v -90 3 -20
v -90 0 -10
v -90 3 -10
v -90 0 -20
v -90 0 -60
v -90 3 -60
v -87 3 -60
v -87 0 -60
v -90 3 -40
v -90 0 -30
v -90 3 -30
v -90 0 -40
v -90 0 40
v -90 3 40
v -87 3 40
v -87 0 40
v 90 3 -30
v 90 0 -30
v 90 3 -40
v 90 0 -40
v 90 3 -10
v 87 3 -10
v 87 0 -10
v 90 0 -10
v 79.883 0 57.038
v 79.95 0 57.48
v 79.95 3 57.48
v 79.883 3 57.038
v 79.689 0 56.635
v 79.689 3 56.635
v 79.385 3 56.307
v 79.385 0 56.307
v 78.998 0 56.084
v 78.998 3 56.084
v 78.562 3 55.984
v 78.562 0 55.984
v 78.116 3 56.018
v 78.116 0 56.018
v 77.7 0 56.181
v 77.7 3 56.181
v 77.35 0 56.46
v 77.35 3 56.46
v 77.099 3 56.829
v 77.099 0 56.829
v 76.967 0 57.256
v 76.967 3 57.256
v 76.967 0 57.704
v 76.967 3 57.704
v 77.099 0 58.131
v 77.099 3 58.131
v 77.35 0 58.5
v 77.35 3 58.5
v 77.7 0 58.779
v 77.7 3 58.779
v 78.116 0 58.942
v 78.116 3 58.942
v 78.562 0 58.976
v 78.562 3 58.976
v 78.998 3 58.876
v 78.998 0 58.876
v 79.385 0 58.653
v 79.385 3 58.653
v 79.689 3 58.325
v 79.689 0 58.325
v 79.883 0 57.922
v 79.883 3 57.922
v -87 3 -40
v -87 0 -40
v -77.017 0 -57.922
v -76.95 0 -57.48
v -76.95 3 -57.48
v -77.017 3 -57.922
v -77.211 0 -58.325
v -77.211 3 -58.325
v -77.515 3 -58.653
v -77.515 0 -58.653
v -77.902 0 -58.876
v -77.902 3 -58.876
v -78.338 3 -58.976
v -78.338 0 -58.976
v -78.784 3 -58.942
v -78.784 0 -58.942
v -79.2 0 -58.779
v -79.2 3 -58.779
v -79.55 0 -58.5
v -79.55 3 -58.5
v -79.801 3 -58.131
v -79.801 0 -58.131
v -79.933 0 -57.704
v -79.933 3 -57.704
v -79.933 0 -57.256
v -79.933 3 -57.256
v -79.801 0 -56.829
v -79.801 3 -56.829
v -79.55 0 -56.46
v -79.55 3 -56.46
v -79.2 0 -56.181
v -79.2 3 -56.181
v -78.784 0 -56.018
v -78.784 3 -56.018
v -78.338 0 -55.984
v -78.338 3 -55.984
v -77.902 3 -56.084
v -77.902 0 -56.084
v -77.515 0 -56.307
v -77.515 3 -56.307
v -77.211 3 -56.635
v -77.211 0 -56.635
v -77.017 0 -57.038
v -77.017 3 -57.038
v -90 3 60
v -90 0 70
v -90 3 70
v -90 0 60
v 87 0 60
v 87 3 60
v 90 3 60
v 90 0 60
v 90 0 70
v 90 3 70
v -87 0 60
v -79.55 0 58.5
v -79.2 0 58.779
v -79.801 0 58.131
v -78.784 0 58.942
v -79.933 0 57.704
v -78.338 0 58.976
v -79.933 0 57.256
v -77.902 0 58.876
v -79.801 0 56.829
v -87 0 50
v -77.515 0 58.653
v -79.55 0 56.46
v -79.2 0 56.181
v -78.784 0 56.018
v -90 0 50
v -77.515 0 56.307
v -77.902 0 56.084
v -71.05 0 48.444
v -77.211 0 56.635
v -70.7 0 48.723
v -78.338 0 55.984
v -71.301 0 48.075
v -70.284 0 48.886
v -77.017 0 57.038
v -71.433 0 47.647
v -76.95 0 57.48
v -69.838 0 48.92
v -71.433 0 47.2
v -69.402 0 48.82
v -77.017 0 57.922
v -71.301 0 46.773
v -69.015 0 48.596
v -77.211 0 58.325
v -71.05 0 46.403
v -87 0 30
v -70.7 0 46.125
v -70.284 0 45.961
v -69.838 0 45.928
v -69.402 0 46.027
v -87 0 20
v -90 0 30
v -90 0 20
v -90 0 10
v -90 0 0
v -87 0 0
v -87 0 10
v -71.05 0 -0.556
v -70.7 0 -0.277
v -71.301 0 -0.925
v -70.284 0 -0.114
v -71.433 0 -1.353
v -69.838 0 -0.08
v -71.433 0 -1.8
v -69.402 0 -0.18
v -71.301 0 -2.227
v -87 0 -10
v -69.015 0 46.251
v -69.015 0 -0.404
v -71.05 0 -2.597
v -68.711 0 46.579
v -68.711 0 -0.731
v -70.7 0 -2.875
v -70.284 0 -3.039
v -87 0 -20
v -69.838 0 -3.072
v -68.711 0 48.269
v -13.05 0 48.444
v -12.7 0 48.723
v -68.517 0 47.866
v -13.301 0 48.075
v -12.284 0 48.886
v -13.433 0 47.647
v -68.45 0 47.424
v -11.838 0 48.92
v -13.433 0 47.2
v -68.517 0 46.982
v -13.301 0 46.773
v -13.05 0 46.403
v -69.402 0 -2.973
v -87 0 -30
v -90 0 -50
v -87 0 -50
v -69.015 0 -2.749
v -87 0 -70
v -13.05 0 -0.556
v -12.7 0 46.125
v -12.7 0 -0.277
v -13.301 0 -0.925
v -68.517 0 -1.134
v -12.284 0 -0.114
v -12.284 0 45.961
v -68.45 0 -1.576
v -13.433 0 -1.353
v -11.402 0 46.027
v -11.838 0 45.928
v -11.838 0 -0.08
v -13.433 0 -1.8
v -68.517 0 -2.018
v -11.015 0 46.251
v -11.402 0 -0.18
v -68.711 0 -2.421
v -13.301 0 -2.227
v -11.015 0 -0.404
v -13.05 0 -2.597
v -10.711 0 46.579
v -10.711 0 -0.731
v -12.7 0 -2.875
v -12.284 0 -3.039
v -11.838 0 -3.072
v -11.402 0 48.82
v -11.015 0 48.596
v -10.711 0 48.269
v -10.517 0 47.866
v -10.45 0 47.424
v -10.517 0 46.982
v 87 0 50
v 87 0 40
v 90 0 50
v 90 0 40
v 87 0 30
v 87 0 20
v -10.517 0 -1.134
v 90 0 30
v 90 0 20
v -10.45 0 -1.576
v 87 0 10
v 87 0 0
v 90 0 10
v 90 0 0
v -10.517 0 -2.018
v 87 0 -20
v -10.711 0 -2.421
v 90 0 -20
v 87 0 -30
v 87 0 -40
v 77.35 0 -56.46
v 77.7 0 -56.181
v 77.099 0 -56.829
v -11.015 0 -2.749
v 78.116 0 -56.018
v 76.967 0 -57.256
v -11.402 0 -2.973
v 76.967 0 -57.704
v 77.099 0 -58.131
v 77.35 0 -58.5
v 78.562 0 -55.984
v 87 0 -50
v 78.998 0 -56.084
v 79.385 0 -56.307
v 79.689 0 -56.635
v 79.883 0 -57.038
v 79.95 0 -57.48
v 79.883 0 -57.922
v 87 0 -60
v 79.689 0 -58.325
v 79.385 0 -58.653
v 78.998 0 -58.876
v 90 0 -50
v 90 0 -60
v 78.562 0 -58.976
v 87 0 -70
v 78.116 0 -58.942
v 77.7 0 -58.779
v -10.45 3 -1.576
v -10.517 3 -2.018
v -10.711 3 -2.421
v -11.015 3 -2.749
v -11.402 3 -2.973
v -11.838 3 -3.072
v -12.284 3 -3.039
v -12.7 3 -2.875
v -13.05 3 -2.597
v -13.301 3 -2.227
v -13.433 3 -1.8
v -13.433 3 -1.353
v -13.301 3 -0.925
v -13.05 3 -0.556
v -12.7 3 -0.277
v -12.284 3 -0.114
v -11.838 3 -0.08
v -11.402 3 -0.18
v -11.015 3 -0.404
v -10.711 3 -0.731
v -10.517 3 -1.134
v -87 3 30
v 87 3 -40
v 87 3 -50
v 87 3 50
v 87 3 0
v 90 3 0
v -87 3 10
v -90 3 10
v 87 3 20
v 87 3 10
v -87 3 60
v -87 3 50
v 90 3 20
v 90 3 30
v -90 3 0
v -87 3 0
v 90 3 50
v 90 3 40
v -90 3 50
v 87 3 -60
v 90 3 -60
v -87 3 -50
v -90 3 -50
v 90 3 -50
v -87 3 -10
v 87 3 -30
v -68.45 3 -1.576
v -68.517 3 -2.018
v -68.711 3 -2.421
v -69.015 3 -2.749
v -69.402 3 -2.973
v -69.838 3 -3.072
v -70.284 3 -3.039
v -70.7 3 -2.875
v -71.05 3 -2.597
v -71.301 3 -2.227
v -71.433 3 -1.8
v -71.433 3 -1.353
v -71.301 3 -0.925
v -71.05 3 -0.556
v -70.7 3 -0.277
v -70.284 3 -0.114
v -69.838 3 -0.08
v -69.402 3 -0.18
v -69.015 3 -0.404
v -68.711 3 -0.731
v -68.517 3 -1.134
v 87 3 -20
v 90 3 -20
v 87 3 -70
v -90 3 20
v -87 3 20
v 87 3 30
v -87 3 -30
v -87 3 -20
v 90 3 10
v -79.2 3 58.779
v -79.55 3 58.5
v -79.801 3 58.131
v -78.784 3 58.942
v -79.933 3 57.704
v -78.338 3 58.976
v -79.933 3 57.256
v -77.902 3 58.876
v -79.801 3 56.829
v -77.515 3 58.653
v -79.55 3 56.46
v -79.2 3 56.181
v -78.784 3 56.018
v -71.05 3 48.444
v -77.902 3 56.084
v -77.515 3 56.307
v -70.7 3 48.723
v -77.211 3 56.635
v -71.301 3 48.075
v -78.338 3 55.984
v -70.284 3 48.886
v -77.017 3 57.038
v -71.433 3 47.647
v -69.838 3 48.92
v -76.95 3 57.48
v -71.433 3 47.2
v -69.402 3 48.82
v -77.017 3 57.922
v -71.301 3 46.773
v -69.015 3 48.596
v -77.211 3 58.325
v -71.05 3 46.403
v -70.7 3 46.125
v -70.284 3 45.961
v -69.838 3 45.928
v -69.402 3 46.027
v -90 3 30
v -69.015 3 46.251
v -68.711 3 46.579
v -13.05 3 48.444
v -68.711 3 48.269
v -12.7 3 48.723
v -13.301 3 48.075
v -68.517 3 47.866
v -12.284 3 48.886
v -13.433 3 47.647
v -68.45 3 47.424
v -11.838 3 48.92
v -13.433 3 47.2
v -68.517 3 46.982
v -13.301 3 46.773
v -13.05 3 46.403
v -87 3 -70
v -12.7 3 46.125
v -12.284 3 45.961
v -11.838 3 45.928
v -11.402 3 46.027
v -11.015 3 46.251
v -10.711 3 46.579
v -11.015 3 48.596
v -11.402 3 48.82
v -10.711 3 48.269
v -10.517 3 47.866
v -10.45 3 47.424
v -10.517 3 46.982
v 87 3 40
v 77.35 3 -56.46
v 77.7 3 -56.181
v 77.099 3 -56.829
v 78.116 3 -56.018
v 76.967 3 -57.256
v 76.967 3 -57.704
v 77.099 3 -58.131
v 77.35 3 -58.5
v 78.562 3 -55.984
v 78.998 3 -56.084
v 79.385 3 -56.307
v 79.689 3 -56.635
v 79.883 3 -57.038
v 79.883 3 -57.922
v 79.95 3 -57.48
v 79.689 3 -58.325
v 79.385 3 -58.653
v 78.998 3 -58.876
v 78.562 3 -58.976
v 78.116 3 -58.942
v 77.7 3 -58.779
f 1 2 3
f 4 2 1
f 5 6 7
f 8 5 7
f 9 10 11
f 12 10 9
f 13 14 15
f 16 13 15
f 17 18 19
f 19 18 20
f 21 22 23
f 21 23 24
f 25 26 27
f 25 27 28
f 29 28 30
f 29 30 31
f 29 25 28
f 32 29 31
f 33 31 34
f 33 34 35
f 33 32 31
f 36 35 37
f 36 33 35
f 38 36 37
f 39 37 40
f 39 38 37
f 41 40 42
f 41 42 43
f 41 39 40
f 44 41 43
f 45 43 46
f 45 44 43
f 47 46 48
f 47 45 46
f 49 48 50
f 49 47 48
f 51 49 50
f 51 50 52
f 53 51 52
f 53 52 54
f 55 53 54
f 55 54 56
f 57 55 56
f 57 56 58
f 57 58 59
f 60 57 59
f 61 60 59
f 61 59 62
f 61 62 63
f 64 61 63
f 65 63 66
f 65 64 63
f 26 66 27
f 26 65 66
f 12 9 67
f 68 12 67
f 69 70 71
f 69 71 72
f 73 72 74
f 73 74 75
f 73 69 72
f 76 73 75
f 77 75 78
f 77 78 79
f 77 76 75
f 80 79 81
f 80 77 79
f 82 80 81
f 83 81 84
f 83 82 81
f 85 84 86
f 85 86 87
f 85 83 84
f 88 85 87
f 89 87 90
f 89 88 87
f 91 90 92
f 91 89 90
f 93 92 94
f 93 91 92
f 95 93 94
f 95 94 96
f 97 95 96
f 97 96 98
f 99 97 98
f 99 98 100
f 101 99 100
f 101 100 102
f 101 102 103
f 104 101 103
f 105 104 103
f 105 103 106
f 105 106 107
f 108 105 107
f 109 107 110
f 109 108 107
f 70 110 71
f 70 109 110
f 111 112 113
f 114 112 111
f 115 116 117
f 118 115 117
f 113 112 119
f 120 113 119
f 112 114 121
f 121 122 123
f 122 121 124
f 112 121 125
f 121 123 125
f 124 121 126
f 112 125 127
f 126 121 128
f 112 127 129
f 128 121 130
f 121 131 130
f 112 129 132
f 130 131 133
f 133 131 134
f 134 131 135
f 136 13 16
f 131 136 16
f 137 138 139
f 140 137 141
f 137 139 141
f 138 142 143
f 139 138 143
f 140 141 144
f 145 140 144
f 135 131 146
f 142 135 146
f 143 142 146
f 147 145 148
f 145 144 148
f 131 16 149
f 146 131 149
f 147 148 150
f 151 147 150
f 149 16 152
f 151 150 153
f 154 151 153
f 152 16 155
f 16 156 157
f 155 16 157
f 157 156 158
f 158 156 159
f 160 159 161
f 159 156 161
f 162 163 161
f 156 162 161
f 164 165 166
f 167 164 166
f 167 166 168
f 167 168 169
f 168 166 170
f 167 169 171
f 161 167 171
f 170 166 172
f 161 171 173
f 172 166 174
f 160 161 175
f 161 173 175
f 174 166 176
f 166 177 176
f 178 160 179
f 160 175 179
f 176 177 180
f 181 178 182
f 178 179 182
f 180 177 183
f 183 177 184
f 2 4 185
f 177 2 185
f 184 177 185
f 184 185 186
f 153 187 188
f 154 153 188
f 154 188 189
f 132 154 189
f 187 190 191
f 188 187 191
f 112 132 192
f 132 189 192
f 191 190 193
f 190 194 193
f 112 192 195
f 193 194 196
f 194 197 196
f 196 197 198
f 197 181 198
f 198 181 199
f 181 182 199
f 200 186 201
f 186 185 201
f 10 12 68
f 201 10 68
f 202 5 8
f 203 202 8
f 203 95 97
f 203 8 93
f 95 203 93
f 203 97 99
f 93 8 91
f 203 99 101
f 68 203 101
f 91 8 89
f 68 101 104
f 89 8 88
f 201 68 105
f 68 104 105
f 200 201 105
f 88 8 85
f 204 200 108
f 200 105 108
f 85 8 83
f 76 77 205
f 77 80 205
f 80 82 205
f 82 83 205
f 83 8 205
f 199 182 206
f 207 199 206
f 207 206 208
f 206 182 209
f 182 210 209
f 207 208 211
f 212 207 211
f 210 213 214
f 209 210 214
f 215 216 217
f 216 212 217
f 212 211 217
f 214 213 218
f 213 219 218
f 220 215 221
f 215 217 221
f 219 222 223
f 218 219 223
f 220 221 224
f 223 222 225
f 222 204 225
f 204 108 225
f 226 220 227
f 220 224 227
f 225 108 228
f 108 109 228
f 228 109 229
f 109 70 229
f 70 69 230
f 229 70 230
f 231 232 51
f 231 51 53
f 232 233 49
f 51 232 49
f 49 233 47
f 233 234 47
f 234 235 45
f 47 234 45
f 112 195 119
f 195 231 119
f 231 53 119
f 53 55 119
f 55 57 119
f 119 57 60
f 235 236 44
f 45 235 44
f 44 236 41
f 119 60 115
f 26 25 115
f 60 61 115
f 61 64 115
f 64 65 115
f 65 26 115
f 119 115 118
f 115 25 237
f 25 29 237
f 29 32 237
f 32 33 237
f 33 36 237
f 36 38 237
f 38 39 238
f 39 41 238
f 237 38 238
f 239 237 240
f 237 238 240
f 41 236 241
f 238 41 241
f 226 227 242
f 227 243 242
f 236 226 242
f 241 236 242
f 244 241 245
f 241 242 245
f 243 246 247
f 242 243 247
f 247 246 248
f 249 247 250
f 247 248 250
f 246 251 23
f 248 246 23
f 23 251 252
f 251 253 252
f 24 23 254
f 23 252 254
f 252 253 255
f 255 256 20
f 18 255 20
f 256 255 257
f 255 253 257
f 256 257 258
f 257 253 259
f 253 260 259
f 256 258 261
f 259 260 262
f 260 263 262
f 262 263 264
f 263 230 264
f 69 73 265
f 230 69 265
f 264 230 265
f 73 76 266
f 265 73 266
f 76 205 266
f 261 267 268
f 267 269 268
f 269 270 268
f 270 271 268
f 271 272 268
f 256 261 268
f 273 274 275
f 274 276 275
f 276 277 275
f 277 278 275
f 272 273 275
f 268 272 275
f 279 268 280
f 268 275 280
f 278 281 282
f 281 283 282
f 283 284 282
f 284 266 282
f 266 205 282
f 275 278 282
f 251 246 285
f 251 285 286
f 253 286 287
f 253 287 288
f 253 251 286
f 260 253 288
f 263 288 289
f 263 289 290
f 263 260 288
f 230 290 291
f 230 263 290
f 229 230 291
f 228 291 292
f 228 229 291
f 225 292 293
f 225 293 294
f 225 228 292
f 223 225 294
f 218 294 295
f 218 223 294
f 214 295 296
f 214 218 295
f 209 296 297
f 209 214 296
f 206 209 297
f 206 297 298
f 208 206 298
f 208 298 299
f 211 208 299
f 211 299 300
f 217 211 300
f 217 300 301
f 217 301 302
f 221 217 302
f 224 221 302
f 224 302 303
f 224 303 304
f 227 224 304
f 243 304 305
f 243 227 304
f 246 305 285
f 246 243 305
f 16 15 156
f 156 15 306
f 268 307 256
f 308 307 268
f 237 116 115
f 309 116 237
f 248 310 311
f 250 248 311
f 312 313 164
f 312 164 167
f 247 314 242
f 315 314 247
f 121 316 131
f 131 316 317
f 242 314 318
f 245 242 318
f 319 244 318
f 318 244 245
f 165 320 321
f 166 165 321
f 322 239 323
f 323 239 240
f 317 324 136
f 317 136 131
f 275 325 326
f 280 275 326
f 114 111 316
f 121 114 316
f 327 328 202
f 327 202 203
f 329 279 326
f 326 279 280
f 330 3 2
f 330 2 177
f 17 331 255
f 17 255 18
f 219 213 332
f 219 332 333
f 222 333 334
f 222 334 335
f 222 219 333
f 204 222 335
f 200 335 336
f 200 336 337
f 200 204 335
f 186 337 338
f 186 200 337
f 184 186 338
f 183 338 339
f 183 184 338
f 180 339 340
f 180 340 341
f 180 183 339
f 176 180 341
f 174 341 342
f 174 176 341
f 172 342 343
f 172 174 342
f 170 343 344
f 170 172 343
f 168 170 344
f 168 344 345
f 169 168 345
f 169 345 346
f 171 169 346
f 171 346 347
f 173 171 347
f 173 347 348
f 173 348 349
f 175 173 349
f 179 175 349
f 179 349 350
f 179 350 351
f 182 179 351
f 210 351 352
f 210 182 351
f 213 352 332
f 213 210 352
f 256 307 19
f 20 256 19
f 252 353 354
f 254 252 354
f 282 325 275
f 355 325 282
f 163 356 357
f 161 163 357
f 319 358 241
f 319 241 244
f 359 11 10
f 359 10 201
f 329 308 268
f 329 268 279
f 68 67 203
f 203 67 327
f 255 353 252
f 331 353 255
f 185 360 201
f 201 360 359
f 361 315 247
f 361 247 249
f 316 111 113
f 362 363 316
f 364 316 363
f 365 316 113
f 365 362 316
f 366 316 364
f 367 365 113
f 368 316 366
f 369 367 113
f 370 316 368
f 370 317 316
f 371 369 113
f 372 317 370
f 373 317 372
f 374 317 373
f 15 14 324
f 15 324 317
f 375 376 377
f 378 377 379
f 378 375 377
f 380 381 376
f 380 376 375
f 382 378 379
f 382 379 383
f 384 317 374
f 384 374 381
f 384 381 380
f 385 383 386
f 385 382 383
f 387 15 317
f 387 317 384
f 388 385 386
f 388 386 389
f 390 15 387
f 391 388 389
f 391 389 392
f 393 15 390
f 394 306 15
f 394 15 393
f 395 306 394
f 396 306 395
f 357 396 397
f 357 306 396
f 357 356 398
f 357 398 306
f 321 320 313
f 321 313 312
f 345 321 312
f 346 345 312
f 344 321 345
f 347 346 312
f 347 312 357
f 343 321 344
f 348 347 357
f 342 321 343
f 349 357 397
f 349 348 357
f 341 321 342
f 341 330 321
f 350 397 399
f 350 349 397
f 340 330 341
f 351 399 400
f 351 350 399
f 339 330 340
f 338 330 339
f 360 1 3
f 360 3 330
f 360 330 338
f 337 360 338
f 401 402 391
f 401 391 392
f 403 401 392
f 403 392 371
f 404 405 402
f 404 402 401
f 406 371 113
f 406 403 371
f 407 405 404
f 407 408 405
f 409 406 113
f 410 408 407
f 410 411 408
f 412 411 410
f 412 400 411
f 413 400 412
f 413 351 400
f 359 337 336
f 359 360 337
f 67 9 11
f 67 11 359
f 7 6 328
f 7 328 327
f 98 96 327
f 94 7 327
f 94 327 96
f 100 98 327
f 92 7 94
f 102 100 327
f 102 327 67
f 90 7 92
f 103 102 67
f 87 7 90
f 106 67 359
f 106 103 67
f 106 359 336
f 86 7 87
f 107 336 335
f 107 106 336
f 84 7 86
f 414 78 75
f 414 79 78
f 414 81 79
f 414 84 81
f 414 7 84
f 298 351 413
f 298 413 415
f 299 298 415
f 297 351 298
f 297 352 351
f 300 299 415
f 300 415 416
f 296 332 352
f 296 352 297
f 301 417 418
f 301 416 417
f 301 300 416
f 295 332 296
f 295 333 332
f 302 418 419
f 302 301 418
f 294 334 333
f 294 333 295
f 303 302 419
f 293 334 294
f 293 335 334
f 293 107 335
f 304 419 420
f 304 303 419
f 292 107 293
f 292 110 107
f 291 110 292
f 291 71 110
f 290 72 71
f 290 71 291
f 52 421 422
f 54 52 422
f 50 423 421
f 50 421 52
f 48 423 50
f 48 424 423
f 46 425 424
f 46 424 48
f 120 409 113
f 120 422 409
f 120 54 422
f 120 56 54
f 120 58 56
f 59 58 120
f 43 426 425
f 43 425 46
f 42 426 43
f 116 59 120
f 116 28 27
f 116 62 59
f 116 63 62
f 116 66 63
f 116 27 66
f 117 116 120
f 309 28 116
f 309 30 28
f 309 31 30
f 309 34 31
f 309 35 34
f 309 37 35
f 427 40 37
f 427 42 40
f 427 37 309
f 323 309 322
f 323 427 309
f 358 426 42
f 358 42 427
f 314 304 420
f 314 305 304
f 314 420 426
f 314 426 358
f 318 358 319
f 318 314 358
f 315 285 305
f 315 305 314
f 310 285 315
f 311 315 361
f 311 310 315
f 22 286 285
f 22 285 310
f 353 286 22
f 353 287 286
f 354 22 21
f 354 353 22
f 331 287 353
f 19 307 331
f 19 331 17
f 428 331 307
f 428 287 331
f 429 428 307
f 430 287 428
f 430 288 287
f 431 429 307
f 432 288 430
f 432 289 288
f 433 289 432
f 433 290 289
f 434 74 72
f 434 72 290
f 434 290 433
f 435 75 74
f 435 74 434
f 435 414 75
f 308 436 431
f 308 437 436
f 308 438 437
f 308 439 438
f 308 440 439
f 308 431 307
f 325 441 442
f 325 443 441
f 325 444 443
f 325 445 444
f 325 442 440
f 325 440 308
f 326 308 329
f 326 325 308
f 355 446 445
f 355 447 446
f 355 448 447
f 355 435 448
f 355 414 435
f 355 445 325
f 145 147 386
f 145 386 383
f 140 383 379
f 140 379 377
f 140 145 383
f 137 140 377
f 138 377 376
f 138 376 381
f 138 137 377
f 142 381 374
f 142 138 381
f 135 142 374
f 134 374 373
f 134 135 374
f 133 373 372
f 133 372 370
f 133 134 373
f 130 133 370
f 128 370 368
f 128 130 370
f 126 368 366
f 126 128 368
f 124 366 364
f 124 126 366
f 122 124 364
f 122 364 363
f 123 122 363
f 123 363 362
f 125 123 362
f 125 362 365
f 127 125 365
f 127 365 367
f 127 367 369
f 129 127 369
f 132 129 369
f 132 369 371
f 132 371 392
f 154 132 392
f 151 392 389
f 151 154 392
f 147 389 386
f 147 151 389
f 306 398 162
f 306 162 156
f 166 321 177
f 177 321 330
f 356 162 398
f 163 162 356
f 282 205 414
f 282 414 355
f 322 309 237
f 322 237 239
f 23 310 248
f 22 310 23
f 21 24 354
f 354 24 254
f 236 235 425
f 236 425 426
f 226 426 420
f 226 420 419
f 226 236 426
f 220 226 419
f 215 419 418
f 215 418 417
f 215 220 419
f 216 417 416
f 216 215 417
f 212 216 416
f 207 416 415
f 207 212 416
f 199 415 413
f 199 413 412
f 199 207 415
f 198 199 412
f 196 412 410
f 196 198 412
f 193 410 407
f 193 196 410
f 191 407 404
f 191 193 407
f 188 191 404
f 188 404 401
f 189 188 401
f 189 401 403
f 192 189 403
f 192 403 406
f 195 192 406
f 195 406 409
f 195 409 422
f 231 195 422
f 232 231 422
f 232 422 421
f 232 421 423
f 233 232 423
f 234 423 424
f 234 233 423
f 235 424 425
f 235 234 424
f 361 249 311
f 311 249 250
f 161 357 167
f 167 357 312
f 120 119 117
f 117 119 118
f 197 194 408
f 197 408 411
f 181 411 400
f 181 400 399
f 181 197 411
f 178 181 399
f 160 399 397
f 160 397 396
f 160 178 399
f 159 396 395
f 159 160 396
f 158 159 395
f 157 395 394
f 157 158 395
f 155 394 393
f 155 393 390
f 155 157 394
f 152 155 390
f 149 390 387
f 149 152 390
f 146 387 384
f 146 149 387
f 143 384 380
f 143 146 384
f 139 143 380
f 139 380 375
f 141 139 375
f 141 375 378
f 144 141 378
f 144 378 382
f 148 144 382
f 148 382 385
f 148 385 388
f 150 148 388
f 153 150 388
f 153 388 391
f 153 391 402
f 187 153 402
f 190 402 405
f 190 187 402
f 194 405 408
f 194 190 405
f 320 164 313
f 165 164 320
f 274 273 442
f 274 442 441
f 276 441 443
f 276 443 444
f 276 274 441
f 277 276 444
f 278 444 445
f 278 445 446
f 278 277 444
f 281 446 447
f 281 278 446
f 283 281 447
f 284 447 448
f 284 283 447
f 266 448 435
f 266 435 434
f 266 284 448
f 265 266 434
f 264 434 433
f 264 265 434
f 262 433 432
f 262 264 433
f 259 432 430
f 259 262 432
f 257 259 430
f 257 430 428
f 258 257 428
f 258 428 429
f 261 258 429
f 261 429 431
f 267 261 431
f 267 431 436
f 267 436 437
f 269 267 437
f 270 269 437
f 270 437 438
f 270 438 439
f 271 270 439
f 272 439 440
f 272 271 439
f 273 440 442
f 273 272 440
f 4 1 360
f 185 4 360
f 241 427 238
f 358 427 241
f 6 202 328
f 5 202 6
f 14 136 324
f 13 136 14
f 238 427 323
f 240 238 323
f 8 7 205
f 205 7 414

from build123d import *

# Parameters (mm, degrees)
ESQUISSE1_W             = 180
ESQUISSE1_H             = 140
ESQUISSE1_R             = 1.5
BOSS_EXTRU_1_DEPTH      = 3
ENL_V_MAT_EXTRU_1_REACH = 5
ESQUISSE2_W             = 3
ESQUISSE2_H             = 10


with BuildPart() as part:
    # Esquisse1 → Boss.-Extru.1 (new body)
    with BuildSketch(Plane(origin=(0, 0, 0), x_dir=(1, 0, 0), z_dir=(0, 1, 0))):
        Rectangle(ESQUISSE1_W, ESQUISSE1_H)
        with Locations((-78.45, 57.48)):
            Circle(ESQUISSE1_R, mode=Mode.SUBTRACT)
        with Locations((78.45, 57.48)):
            Circle(ESQUISSE1_R, mode=Mode.SUBTRACT)
        with Locations((78.45, -57.48)):
            Circle(ESQUISSE1_R, mode=Mode.SUBTRACT)
        with Locations((-78.45, -57.48)):
            Circle(ESQUISSE1_R, mode=Mode.SUBTRACT)
        with Locations((-69.95, 1.57626837)):
            Circle(ESQUISSE1_R, mode=Mode.SUBTRACT)
        with Locations((-11.95, 1.57626837)):
            Circle(ESQUISSE1_R, mode=Mode.SUBTRACT)
        with Locations((-69.95, -47.42373163)):
            Circle(ESQUISSE1_R, mode=Mode.SUBTRACT)
        with Locations((-11.95, -47.42373163)):
            Circle(ESQUISSE1_R, mode=Mode.SUBTRACT)
    extrude(amount=BOSS_EXTRU_1_DEPTH)

    # Esquisse2 → Enlèv. mat.-Extru.1 (cut, up to next)
    with BuildSketch(Plane(origin=(0, 3, 0), x_dir=(1, 0, 0), z_dir=(0, 1, 0)), mode=Mode.PRIVATE) as enl_v_mat_extru_1_sk1:
        with Locations((-88.5, 45)):
            Rectangle(ESQUISSE2_W, ESQUISSE2_H)
    enl_v_mat_extru_1_tool1 = extrude(enl_v_mat_extru_1_sk1.sketch, amount=-ENL_V_MAT_EXTRU_1_REACH, mode=Mode.PRIVATE) & part.part
    add(enl_v_mat_extru_1_tool1.solids().sort_by_distance((-88.5, 3, -45))[0], mode=Mode.SUBTRACT)
    # Esquisse2 → Enlèv. mat.-Extru.1 (cut, up to next)
    with BuildSketch(Plane(origin=(0, 3, 0), x_dir=(1, 0, 0), z_dir=(0, 1, 0)), mode=Mode.PRIVATE) as enl_v_mat_extru_1_sk2:
        with Locations((-88.5, 65)):
            Rectangle(ESQUISSE2_W, ESQUISSE2_H)
    enl_v_mat_extru_1_tool2 = extrude(enl_v_mat_extru_1_sk2.sketch, amount=-ENL_V_MAT_EXTRU_1_REACH, mode=Mode.PRIVATE) & part.part
    add(enl_v_mat_extru_1_tool2.solids().sort_by_distance((-88.5, 3, -65))[0], mode=Mode.SUBTRACT)
    # Esquisse2 → Enlèv. mat.-Extru.1 (cut, up to next)
    with BuildSketch(Plane(origin=(0, 3, 0), x_dir=(1, 0, 0), z_dir=(0, 1, 0)), mode=Mode.PRIVATE) as enl_v_mat_extru_1_sk3:
        with Locations((-88.5, 25)):
            Rectangle(ESQUISSE2_W, ESQUISSE2_H)
    enl_v_mat_extru_1_tool3 = extrude(enl_v_mat_extru_1_sk3.sketch, amount=-ENL_V_MAT_EXTRU_1_REACH, mode=Mode.PRIVATE) & part.part
    add(enl_v_mat_extru_1_tool3.solids().sort_by_distance((-88.5, 3, -25))[0], mode=Mode.SUBTRACT)
    # Esquisse2 → Enlèv. mat.-Extru.1 (cut, up to next)
    with BuildSketch(Plane(origin=(0, 3, 0), x_dir=(1, 0, 0), z_dir=(0, 1, 0)), mode=Mode.PRIVATE) as enl_v_mat_extru_1_sk4:
        with Locations((-88.5, 5)):
            Rectangle(ESQUISSE2_W, ESQUISSE2_H)
    enl_v_mat_extru_1_tool4 = extrude(enl_v_mat_extru_1_sk4.sketch, amount=-ENL_V_MAT_EXTRU_1_REACH, mode=Mode.PRIVATE) & part.part
    add(enl_v_mat_extru_1_tool4.solids().sort_by_distance((-88.5, 3, -5))[0], mode=Mode.SUBTRACT)
    # Esquisse2 → Enlèv. mat.-Extru.1 (cut, up to next)
    with BuildSketch(Plane(origin=(0, 3, 0), x_dir=(1, 0, 0), z_dir=(0, 1, 0)), mode=Mode.PRIVATE) as enl_v_mat_extru_1_sk5:
        with Locations((-88.5, -15)):
            Rectangle(ESQUISSE2_W, ESQUISSE2_H)
    enl_v_mat_extru_1_tool5 = extrude(enl_v_mat_extru_1_sk5.sketch, amount=-ENL_V_MAT_EXTRU_1_REACH, mode=Mode.PRIVATE) & part.part
    add(enl_v_mat_extru_1_tool5.solids().sort_by_distance((-88.5, 3, 15))[0], mode=Mode.SUBTRACT)
    # Esquisse2 → Enlèv. mat.-Extru.1 (cut, up to next)
    with BuildSketch(Plane(origin=(0, 3, 0), x_dir=(1, 0, 0), z_dir=(0, 1, 0)), mode=Mode.PRIVATE) as enl_v_mat_extru_1_sk6:
        with Locations((-88.5, -35)):
            Rectangle(ESQUISSE2_W, ESQUISSE2_H)
    enl_v_mat_extru_1_tool6 = extrude(enl_v_mat_extru_1_sk6.sketch, amount=-ENL_V_MAT_EXTRU_1_REACH, mode=Mode.PRIVATE) & part.part
    add(enl_v_mat_extru_1_tool6.solids().sort_by_distance((-88.5, 3, 35))[0], mode=Mode.SUBTRACT)
    # Esquisse2 → Enlèv. mat.-Extru.1 (cut, up to next)
    with BuildSketch(Plane(origin=(0, 3, 0), x_dir=(1, 0, 0), z_dir=(0, 1, 0)), mode=Mode.PRIVATE) as enl_v_mat_extru_1_sk7:
        with Locations((-88.5, -55)):
            Rectangle(ESQUISSE2_W, ESQUISSE2_H)
    enl_v_mat_extru_1_tool7 = extrude(enl_v_mat_extru_1_sk7.sketch, amount=-ENL_V_MAT_EXTRU_1_REACH, mode=Mode.PRIVATE) & part.part
    add(enl_v_mat_extru_1_tool7.solids().sort_by_distance((-88.5, 3, 55))[0], mode=Mode.SUBTRACT)
    # Esquisse2 → Enlèv. mat.-Extru.1 (cut, up to next)
    with BuildSketch(Plane(origin=(0, 3, 0), x_dir=(1, 0, 0), z_dir=(0, 1, 0)), mode=Mode.PRIVATE) as enl_v_mat_extru_1_sk8:
        with Locations((88.5, -55)):
            Rectangle(ESQUISSE2_W, ESQUISSE2_H)
    enl_v_mat_extru_1_tool8 = extrude(enl_v_mat_extru_1_sk8.sketch, amount=-ENL_V_MAT_EXTRU_1_REACH, mode=Mode.PRIVATE) & part.part
    add(enl_v_mat_extru_1_tool8.solids().sort_by_distance((88.5, 3, 55))[0], mode=Mode.SUBTRACT)
    # Esquisse2 → Enlèv. mat.-Extru.1 (cut, up to next)
    with BuildSketch(Plane(origin=(0, 3, 0), x_dir=(1, 0, 0), z_dir=(0, 1, 0)), mode=Mode.PRIVATE) as enl_v_mat_extru_1_sk9:
        with Locations((88.5, -35)):
            Rectangle(ESQUISSE2_W, ESQUISSE2_H)
    enl_v_mat_extru_1_tool9 = extrude(enl_v_mat_extru_1_sk9.sketch, amount=-ENL_V_MAT_EXTRU_1_REACH, mode=Mode.PRIVATE) & part.part
    add(enl_v_mat_extru_1_tool9.solids().sort_by_distance((88.5, 3, 35))[0], mode=Mode.SUBTRACT)
    # Esquisse2 → Enlèv. mat.-Extru.1 (cut, up to next)
    with BuildSketch(Plane(origin=(0, 3, 0), x_dir=(1, 0, 0), z_dir=(0, 1, 0)), mode=Mode.PRIVATE) as enl_v_mat_extru_1_sk10:
        with Locations((88.5, -15)):
            Rectangle(ESQUISSE2_W, ESQUISSE2_H)
    enl_v_mat_extru_1_tool10 = extrude(enl_v_mat_extru_1_sk10.sketch, amount=-ENL_V_MAT_EXTRU_1_REACH, mode=Mode.PRIVATE) & part.part
    add(enl_v_mat_extru_1_tool10.solids().sort_by_distance((88.5, 3, 15))[0], mode=Mode.SUBTRACT)
    # Esquisse2 → Enlèv. mat.-Extru.1 (cut, up to next)
    with BuildSketch(Plane(origin=(0, 3, 0), x_dir=(1, 0, 0), z_dir=(0, 1, 0)), mode=Mode.PRIVATE) as enl_v_mat_extru_1_sk11:
        with Locations((88.5, 5)):
            Rectangle(ESQUISSE2_W, ESQUISSE2_H)
    enl_v_mat_extru_1_tool11 = extrude(enl_v_mat_extru_1_sk11.sketch, amount=-ENL_V_MAT_EXTRU_1_REACH, mode=Mode.PRIVATE) & part.part
    add(enl_v_mat_extru_1_tool11.solids().sort_by_distance((88.5, 3, -5))[0], mode=Mode.SUBTRACT)
    # Esquisse2 → Enlèv. mat.-Extru.1 (cut, up to next)
    with BuildSketch(Plane(origin=(0, 3, 0), x_dir=(1, 0, 0), z_dir=(0, 1, 0)), mode=Mode.PRIVATE) as enl_v_mat_extru_1_sk12:
        with Locations((88.5, 25)):
            Rectangle(ESQUISSE2_W, ESQUISSE2_H)
    enl_v_mat_extru_1_tool12 = extrude(enl_v_mat_extru_1_sk12.sketch, amount=-ENL_V_MAT_EXTRU_1_REACH, mode=Mode.PRIVATE) & part.part
    add(enl_v_mat_extru_1_tool12.solids().sort_by_distance((88.5, 3, -25))[0], mode=Mode.SUBTRACT)
    # Esquisse2 → Enlèv. mat.-Extru.1 (cut, up to next)
    with BuildSketch(Plane(origin=(0, 3, 0), x_dir=(1, 0, 0), z_dir=(0, 1, 0)), mode=Mode.PRIVATE) as enl_v_mat_extru_1_sk13:
        with Locations((88.5, 45)):
            Rectangle(ESQUISSE2_W, ESQUISSE2_H)
    enl_v_mat_extru_1_tool13 = extrude(enl_v_mat_extru_1_sk13.sketch, amount=-ENL_V_MAT_EXTRU_1_REACH, mode=Mode.PRIVATE) & part.part
    add(enl_v_mat_extru_1_tool13.solids().sort_by_distance((88.5, 3, -45))[0], mode=Mode.SUBTRACT)
    # Esquisse2 → Enlèv. mat.-Extru.1 (cut, up to next)
    with BuildSketch(Plane(origin=(0, 3, 0), x_dir=(1, 0, 0), z_dir=(0, 1, 0)), mode=Mode.PRIVATE) as enl_v_mat_extru_1_sk14:
        with Locations((88.5, 65)):
            Rectangle(ESQUISSE2_W, ESQUISSE2_H)
    enl_v_mat_extru_1_tool14 = extrude(enl_v_mat_extru_1_sk14.sketch, amount=-ENL_V_MAT_EXTRU_1_REACH, mode=Mode.PRIVATE) & part.part
    add(enl_v_mat_extru_1_tool14.solids().sort_by_distance((88.5, 3, -65))[0], mode=Mode.SUBTRACT)


solid = part.part
